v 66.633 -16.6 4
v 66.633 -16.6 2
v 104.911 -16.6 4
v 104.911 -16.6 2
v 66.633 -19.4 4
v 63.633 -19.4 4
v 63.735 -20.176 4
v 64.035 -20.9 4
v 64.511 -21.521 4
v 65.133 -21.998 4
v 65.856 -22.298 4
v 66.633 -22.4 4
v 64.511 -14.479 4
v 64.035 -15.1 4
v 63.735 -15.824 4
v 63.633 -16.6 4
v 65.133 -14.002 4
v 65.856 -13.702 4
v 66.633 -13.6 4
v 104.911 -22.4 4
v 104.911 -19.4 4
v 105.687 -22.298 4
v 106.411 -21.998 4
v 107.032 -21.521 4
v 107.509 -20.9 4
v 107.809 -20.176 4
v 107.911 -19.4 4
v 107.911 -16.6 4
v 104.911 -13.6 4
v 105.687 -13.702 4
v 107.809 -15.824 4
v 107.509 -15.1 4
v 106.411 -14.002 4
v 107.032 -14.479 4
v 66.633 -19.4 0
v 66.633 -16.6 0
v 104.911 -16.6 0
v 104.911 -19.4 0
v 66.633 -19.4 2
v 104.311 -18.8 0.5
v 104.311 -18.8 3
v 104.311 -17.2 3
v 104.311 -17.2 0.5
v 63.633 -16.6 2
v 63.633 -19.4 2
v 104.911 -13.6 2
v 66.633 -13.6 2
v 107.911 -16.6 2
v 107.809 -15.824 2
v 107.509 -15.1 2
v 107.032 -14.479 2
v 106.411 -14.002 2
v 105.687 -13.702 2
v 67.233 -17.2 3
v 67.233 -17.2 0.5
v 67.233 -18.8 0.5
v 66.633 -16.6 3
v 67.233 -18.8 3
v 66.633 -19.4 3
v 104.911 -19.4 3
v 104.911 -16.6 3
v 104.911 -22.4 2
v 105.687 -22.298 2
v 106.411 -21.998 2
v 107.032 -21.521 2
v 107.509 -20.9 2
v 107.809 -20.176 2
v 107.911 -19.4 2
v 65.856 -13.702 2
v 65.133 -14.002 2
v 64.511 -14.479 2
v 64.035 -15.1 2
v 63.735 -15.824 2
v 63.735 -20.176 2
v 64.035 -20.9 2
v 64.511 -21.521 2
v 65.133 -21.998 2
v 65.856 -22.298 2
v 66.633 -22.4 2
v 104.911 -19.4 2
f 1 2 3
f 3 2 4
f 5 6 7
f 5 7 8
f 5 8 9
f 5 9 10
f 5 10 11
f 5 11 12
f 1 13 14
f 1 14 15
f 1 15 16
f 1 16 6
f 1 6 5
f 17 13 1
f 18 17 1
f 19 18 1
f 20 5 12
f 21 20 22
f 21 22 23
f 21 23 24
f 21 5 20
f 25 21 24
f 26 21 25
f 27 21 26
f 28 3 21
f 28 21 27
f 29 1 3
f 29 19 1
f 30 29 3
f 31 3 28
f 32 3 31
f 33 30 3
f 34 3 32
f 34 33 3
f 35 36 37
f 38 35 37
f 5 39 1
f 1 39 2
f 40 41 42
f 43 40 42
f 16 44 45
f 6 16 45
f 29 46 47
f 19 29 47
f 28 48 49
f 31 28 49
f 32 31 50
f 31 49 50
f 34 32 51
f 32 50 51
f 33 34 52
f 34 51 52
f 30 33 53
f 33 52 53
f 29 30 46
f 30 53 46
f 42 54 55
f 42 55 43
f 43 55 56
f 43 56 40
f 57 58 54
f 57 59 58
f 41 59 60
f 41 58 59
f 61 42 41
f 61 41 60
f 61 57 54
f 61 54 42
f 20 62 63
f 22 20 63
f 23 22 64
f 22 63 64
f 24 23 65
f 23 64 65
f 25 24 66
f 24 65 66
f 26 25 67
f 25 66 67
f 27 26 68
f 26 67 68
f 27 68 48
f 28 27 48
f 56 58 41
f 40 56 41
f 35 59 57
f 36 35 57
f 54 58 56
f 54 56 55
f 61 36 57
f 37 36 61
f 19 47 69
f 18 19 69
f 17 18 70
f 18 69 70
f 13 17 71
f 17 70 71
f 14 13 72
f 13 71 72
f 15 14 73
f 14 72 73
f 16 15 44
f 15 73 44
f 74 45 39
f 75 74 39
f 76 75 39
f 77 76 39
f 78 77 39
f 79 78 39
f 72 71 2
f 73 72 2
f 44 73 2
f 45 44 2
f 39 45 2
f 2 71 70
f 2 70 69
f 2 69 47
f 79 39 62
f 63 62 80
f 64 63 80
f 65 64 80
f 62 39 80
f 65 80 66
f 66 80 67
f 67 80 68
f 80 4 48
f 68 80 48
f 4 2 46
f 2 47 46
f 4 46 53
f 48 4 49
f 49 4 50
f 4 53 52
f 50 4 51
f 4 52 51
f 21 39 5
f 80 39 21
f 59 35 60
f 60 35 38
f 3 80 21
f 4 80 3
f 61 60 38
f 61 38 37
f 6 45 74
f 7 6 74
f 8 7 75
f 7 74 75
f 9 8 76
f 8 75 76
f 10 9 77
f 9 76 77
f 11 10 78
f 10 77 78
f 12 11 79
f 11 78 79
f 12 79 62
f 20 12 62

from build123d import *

# Parameters (mm, degrees)
ESQUISSE1_W             = 38.278150704
ESQUISSE1_H             = 2.8
BOSS_EXTRU_1_DEPTH      = 3
ESQUISSE2_W             = 37.078150704
ESQUISSE2_H             = 1.6
ENL_V_MAT_EXTRU_1_DEPTH = 2.5
BOSS_EXTRU_2_DEPTH      = 1
BOSS_EXTRU_2_DEPTH_BACK = 1
ESQUISSE3_W             = 38.278150704
ESQUISSE3_H             = 2.8


with BuildPart() as part:
    # Esquisse1 → Boss.-Extru.1 (new body)
    with BuildSketch(Plane.XY):
        with Locations((85.771739029, -17.999999993)):
            Rectangle(ESQUISSE1_W, ESQUISSE1_H)
    extrude(amount=BOSS_EXTRU_1_DEPTH)

    # Esquisse2 → Enlèv. mat.-Extru.1 (cut)
    with BuildSketch(Plane.XY.offset(3)):
        with Locations((85.771739029, -17.999999993)):
            Rectangle(ESQUISSE2_W, ESQUISSE2_H)
    extrude(amount=-ENL_V_MAT_EXTRU_1_DEPTH, mode=Mode.SUBTRACT)


with BuildPart() as body_2:
    # Esquisse3 → Boss.-Extru.2 (new, two sides: drawn at the far end of the back side and taken through both)
    with BuildSketch(Plane.XY.offset(3).offset(-BOSS_EXTRU_2_DEPTH_BACK)):
        with BuildLine():
            Line((104.910814381, -13.599999993), (66.632663677, -13.599999993))
            ThreePointArc((66.632663677, -13.599999993), (64.511343334, -14.478679649), (63.632663677, -16.599999993))
            Line((63.632663677, -16.599999993), (63.632663677, -19.399999993))
            ThreePointArc((63.632663677, -19.399999993), (64.511343334, -21.521320336), (66.632663677, -22.399999993))
            Line((66.632663677, -22.399999993), (104.910814381, -22.399999993))
            ThreePointArc((104.910814381, -22.399999993), (107.032134724, -21.521320336), (107.910814381, -19.399999993))
            Line((107.910814381, -19.399999993), (107.910814381, -16.599999993))
            ThreePointArc((107.910814381, -16.599999993), (107.032134724, -14.478679649), (104.910814381, -13.599999993))
        make_face()
        with Locations((85.771739029, -17.999999993)):
            Rectangle(ESQUISSE3_W, ESQUISSE3_H, mode=Mode.SUBTRACT)
    extrude(amount=BOSS_EXTRU_2_DEPTH + BOSS_EXTRU_2_DEPTH_BACK)


solid = Compound([part.part, body_2.part])
